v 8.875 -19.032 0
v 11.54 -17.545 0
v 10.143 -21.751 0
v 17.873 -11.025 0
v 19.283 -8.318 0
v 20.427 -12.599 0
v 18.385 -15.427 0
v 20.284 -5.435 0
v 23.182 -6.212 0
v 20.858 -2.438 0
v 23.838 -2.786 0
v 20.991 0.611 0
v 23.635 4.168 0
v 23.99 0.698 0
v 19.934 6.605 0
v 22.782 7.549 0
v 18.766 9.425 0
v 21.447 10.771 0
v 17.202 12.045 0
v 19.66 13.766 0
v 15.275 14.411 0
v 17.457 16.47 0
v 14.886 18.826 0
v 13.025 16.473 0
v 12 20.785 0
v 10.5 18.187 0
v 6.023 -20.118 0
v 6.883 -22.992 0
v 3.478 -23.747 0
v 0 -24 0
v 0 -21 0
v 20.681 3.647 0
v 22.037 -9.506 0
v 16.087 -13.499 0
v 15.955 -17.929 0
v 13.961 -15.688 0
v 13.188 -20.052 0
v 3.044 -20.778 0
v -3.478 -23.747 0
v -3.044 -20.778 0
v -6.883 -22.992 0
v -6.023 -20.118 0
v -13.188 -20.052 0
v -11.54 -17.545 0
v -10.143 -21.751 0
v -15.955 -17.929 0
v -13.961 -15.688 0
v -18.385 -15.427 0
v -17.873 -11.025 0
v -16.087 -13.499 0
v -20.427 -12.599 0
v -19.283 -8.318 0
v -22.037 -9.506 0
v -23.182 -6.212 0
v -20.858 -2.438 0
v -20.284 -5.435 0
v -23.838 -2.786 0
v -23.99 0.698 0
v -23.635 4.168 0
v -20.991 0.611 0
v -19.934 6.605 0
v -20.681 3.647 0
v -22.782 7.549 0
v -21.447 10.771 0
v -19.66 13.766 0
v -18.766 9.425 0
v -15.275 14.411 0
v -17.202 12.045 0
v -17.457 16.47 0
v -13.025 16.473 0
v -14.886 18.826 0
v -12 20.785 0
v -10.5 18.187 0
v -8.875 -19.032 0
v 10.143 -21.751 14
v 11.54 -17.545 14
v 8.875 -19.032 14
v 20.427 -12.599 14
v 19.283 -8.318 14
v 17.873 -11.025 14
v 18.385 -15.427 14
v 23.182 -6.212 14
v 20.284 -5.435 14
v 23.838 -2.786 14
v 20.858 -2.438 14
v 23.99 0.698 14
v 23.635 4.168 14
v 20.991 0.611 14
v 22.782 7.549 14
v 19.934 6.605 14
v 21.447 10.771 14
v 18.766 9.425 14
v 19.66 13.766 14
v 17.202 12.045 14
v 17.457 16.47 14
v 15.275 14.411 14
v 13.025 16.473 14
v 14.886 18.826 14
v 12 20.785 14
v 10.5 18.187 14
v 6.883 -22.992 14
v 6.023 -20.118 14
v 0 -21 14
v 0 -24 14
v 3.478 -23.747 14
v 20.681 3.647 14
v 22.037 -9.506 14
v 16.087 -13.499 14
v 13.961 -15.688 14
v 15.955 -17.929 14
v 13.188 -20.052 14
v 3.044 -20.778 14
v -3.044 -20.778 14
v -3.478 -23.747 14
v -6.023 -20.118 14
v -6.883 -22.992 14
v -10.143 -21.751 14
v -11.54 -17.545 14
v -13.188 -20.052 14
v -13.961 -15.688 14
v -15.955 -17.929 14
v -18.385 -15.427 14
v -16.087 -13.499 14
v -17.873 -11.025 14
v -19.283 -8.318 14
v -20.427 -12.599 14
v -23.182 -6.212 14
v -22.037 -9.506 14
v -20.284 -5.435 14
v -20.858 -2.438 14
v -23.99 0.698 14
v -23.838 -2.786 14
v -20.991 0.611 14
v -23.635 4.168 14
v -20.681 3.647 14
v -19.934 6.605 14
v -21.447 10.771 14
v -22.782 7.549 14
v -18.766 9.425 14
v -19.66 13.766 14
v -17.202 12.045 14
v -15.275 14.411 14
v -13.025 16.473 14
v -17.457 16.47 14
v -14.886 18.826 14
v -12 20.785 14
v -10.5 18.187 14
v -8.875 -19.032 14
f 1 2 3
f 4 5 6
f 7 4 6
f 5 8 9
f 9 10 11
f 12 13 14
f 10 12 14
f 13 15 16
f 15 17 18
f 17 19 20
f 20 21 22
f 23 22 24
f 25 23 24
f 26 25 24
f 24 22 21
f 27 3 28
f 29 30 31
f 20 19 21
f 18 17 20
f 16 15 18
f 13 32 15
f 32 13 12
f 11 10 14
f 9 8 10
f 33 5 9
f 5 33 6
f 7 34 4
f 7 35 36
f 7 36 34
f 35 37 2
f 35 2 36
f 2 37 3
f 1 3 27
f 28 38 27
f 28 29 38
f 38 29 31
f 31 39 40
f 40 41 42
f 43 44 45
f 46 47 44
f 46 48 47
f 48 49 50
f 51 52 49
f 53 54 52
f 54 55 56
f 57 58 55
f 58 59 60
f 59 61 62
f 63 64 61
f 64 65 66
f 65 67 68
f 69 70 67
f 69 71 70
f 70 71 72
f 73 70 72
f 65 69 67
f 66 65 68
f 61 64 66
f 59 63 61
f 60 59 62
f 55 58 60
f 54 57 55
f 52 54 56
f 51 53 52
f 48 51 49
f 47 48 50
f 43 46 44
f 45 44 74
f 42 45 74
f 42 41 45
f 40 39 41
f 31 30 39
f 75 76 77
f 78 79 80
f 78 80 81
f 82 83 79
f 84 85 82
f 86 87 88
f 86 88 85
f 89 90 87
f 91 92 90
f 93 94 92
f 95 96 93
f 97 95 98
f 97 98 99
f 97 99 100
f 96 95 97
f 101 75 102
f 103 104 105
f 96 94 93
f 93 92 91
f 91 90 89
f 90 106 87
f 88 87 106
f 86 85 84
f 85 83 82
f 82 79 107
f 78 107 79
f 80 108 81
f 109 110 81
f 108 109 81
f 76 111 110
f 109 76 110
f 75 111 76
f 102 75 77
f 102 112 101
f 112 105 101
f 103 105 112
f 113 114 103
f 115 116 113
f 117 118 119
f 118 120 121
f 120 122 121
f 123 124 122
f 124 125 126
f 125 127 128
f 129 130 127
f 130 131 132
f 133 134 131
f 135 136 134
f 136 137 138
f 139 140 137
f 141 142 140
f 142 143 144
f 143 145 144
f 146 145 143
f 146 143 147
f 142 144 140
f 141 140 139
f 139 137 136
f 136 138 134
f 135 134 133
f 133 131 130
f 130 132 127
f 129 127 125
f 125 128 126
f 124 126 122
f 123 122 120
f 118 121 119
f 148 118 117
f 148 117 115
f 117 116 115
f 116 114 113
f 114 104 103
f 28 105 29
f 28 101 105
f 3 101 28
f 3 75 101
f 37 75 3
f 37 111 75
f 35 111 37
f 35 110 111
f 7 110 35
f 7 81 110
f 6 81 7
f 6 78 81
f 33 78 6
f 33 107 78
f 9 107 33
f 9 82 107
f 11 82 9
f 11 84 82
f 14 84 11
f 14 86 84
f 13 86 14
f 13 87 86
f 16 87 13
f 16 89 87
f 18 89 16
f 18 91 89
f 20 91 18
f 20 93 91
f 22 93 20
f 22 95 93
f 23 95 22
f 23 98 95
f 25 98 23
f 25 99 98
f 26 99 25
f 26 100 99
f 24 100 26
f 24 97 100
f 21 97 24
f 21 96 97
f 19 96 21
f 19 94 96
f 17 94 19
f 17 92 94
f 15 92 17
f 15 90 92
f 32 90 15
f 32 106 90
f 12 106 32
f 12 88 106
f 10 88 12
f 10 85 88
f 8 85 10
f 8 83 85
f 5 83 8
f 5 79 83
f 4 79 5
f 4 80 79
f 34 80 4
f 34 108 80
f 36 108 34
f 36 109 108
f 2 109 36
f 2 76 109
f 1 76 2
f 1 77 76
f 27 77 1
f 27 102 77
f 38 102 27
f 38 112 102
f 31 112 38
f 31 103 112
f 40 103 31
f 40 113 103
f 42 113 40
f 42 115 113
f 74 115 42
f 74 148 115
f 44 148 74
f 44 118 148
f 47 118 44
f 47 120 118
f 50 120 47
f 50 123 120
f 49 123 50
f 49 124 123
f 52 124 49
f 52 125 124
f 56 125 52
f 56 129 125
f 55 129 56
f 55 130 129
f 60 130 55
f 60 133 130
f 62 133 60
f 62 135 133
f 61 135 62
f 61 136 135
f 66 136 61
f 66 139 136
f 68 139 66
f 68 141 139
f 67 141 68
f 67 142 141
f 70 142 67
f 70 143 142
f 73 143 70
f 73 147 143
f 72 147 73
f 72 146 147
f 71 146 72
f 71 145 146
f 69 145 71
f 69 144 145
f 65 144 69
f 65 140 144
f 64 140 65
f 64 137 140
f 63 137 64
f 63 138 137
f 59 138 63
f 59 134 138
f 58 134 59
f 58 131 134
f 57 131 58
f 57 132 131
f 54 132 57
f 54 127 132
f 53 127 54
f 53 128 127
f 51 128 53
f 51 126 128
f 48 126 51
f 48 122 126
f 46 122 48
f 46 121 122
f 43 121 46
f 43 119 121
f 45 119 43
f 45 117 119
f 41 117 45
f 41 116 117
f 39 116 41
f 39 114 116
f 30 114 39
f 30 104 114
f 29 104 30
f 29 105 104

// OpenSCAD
$fn = 32;

// ----------------------------------------------------------------------
// Spring clip: 48 mm outside, 3 mm band, 60 degree opening
// ----------------------------------------------------------------------

// --- parameters (mm) ---
outer_r = 24;             // clip outside radius
inner_r = 21;             // clip bore radius
band = 3;                 // band thickness
clip_w = 14;              // clip width
opening = 60;             // opening angle

clip_profile = [[-12, 20.785], [-14.886, 18.826], [-17.457, 16.47], [-19.66, 13.766], [-21.447, 10.771], [-22.782, 7.549], [-23.635, 4.168], [-23.99, 0.698], [-23.838, -2.786], [-23.182, -6.212], [-22.037, -9.506], [-20.427, -12.599], [-18.385, -15.427], [-15.955, -17.929], [-13.188, -20.052], [-10.143, -21.751], [-6.883, -22.992], [-3.478, -23.747], [0, -24], [3.478, -23.747], [6.883, -22.992], [10.143, -21.751], [13.188, -20.052], [15.955, -17.929], [18.385, -15.427], [20.427, -12.599], [22.037, -9.506], [23.182, -6.212], [23.838, -2.786], [23.99, 0.698], [23.635, 4.168], [22.782, 7.549], [21.447, 10.771], [19.66, 13.766], [17.457, 16.47], [14.886, 18.826], [12, 20.785], [10.5, 18.187], [13.025, 16.473], [15.275, 14.411], [17.202, 12.045], [18.766, 9.425], [19.934, 6.605], [20.681, 3.647], [20.991, 0.611], [20.858, -2.438], [20.284, -5.435], [19.283, -8.318], [17.873, -11.025], [16.087, -13.499], [13.961, -15.688], [11.54, -17.545], [8.875, -19.032], [6.023, -20.118], [3.044, -20.778], [0, -21], [-3.044, -20.778], [-6.023, -20.118], [-8.875, -19.032], [-11.54, -17.545], [-13.961, -15.688], [-16.087, -13.499], [-17.873, -11.025], [-19.283, -8.318], [-20.284, -5.435], [-20.858, -2.438], [-20.991, 0.611], [-20.681, 3.647], [-19.934, 6.605], [-18.766, 9.425], [-17.202, 12.045], [-15.275, 14.411], [-13.025, 16.473], [-10.5, 18.187]];

difference() {
  union() {
    linear_extrude(height = clip_w) polygon(clip_profile);
  }
}
